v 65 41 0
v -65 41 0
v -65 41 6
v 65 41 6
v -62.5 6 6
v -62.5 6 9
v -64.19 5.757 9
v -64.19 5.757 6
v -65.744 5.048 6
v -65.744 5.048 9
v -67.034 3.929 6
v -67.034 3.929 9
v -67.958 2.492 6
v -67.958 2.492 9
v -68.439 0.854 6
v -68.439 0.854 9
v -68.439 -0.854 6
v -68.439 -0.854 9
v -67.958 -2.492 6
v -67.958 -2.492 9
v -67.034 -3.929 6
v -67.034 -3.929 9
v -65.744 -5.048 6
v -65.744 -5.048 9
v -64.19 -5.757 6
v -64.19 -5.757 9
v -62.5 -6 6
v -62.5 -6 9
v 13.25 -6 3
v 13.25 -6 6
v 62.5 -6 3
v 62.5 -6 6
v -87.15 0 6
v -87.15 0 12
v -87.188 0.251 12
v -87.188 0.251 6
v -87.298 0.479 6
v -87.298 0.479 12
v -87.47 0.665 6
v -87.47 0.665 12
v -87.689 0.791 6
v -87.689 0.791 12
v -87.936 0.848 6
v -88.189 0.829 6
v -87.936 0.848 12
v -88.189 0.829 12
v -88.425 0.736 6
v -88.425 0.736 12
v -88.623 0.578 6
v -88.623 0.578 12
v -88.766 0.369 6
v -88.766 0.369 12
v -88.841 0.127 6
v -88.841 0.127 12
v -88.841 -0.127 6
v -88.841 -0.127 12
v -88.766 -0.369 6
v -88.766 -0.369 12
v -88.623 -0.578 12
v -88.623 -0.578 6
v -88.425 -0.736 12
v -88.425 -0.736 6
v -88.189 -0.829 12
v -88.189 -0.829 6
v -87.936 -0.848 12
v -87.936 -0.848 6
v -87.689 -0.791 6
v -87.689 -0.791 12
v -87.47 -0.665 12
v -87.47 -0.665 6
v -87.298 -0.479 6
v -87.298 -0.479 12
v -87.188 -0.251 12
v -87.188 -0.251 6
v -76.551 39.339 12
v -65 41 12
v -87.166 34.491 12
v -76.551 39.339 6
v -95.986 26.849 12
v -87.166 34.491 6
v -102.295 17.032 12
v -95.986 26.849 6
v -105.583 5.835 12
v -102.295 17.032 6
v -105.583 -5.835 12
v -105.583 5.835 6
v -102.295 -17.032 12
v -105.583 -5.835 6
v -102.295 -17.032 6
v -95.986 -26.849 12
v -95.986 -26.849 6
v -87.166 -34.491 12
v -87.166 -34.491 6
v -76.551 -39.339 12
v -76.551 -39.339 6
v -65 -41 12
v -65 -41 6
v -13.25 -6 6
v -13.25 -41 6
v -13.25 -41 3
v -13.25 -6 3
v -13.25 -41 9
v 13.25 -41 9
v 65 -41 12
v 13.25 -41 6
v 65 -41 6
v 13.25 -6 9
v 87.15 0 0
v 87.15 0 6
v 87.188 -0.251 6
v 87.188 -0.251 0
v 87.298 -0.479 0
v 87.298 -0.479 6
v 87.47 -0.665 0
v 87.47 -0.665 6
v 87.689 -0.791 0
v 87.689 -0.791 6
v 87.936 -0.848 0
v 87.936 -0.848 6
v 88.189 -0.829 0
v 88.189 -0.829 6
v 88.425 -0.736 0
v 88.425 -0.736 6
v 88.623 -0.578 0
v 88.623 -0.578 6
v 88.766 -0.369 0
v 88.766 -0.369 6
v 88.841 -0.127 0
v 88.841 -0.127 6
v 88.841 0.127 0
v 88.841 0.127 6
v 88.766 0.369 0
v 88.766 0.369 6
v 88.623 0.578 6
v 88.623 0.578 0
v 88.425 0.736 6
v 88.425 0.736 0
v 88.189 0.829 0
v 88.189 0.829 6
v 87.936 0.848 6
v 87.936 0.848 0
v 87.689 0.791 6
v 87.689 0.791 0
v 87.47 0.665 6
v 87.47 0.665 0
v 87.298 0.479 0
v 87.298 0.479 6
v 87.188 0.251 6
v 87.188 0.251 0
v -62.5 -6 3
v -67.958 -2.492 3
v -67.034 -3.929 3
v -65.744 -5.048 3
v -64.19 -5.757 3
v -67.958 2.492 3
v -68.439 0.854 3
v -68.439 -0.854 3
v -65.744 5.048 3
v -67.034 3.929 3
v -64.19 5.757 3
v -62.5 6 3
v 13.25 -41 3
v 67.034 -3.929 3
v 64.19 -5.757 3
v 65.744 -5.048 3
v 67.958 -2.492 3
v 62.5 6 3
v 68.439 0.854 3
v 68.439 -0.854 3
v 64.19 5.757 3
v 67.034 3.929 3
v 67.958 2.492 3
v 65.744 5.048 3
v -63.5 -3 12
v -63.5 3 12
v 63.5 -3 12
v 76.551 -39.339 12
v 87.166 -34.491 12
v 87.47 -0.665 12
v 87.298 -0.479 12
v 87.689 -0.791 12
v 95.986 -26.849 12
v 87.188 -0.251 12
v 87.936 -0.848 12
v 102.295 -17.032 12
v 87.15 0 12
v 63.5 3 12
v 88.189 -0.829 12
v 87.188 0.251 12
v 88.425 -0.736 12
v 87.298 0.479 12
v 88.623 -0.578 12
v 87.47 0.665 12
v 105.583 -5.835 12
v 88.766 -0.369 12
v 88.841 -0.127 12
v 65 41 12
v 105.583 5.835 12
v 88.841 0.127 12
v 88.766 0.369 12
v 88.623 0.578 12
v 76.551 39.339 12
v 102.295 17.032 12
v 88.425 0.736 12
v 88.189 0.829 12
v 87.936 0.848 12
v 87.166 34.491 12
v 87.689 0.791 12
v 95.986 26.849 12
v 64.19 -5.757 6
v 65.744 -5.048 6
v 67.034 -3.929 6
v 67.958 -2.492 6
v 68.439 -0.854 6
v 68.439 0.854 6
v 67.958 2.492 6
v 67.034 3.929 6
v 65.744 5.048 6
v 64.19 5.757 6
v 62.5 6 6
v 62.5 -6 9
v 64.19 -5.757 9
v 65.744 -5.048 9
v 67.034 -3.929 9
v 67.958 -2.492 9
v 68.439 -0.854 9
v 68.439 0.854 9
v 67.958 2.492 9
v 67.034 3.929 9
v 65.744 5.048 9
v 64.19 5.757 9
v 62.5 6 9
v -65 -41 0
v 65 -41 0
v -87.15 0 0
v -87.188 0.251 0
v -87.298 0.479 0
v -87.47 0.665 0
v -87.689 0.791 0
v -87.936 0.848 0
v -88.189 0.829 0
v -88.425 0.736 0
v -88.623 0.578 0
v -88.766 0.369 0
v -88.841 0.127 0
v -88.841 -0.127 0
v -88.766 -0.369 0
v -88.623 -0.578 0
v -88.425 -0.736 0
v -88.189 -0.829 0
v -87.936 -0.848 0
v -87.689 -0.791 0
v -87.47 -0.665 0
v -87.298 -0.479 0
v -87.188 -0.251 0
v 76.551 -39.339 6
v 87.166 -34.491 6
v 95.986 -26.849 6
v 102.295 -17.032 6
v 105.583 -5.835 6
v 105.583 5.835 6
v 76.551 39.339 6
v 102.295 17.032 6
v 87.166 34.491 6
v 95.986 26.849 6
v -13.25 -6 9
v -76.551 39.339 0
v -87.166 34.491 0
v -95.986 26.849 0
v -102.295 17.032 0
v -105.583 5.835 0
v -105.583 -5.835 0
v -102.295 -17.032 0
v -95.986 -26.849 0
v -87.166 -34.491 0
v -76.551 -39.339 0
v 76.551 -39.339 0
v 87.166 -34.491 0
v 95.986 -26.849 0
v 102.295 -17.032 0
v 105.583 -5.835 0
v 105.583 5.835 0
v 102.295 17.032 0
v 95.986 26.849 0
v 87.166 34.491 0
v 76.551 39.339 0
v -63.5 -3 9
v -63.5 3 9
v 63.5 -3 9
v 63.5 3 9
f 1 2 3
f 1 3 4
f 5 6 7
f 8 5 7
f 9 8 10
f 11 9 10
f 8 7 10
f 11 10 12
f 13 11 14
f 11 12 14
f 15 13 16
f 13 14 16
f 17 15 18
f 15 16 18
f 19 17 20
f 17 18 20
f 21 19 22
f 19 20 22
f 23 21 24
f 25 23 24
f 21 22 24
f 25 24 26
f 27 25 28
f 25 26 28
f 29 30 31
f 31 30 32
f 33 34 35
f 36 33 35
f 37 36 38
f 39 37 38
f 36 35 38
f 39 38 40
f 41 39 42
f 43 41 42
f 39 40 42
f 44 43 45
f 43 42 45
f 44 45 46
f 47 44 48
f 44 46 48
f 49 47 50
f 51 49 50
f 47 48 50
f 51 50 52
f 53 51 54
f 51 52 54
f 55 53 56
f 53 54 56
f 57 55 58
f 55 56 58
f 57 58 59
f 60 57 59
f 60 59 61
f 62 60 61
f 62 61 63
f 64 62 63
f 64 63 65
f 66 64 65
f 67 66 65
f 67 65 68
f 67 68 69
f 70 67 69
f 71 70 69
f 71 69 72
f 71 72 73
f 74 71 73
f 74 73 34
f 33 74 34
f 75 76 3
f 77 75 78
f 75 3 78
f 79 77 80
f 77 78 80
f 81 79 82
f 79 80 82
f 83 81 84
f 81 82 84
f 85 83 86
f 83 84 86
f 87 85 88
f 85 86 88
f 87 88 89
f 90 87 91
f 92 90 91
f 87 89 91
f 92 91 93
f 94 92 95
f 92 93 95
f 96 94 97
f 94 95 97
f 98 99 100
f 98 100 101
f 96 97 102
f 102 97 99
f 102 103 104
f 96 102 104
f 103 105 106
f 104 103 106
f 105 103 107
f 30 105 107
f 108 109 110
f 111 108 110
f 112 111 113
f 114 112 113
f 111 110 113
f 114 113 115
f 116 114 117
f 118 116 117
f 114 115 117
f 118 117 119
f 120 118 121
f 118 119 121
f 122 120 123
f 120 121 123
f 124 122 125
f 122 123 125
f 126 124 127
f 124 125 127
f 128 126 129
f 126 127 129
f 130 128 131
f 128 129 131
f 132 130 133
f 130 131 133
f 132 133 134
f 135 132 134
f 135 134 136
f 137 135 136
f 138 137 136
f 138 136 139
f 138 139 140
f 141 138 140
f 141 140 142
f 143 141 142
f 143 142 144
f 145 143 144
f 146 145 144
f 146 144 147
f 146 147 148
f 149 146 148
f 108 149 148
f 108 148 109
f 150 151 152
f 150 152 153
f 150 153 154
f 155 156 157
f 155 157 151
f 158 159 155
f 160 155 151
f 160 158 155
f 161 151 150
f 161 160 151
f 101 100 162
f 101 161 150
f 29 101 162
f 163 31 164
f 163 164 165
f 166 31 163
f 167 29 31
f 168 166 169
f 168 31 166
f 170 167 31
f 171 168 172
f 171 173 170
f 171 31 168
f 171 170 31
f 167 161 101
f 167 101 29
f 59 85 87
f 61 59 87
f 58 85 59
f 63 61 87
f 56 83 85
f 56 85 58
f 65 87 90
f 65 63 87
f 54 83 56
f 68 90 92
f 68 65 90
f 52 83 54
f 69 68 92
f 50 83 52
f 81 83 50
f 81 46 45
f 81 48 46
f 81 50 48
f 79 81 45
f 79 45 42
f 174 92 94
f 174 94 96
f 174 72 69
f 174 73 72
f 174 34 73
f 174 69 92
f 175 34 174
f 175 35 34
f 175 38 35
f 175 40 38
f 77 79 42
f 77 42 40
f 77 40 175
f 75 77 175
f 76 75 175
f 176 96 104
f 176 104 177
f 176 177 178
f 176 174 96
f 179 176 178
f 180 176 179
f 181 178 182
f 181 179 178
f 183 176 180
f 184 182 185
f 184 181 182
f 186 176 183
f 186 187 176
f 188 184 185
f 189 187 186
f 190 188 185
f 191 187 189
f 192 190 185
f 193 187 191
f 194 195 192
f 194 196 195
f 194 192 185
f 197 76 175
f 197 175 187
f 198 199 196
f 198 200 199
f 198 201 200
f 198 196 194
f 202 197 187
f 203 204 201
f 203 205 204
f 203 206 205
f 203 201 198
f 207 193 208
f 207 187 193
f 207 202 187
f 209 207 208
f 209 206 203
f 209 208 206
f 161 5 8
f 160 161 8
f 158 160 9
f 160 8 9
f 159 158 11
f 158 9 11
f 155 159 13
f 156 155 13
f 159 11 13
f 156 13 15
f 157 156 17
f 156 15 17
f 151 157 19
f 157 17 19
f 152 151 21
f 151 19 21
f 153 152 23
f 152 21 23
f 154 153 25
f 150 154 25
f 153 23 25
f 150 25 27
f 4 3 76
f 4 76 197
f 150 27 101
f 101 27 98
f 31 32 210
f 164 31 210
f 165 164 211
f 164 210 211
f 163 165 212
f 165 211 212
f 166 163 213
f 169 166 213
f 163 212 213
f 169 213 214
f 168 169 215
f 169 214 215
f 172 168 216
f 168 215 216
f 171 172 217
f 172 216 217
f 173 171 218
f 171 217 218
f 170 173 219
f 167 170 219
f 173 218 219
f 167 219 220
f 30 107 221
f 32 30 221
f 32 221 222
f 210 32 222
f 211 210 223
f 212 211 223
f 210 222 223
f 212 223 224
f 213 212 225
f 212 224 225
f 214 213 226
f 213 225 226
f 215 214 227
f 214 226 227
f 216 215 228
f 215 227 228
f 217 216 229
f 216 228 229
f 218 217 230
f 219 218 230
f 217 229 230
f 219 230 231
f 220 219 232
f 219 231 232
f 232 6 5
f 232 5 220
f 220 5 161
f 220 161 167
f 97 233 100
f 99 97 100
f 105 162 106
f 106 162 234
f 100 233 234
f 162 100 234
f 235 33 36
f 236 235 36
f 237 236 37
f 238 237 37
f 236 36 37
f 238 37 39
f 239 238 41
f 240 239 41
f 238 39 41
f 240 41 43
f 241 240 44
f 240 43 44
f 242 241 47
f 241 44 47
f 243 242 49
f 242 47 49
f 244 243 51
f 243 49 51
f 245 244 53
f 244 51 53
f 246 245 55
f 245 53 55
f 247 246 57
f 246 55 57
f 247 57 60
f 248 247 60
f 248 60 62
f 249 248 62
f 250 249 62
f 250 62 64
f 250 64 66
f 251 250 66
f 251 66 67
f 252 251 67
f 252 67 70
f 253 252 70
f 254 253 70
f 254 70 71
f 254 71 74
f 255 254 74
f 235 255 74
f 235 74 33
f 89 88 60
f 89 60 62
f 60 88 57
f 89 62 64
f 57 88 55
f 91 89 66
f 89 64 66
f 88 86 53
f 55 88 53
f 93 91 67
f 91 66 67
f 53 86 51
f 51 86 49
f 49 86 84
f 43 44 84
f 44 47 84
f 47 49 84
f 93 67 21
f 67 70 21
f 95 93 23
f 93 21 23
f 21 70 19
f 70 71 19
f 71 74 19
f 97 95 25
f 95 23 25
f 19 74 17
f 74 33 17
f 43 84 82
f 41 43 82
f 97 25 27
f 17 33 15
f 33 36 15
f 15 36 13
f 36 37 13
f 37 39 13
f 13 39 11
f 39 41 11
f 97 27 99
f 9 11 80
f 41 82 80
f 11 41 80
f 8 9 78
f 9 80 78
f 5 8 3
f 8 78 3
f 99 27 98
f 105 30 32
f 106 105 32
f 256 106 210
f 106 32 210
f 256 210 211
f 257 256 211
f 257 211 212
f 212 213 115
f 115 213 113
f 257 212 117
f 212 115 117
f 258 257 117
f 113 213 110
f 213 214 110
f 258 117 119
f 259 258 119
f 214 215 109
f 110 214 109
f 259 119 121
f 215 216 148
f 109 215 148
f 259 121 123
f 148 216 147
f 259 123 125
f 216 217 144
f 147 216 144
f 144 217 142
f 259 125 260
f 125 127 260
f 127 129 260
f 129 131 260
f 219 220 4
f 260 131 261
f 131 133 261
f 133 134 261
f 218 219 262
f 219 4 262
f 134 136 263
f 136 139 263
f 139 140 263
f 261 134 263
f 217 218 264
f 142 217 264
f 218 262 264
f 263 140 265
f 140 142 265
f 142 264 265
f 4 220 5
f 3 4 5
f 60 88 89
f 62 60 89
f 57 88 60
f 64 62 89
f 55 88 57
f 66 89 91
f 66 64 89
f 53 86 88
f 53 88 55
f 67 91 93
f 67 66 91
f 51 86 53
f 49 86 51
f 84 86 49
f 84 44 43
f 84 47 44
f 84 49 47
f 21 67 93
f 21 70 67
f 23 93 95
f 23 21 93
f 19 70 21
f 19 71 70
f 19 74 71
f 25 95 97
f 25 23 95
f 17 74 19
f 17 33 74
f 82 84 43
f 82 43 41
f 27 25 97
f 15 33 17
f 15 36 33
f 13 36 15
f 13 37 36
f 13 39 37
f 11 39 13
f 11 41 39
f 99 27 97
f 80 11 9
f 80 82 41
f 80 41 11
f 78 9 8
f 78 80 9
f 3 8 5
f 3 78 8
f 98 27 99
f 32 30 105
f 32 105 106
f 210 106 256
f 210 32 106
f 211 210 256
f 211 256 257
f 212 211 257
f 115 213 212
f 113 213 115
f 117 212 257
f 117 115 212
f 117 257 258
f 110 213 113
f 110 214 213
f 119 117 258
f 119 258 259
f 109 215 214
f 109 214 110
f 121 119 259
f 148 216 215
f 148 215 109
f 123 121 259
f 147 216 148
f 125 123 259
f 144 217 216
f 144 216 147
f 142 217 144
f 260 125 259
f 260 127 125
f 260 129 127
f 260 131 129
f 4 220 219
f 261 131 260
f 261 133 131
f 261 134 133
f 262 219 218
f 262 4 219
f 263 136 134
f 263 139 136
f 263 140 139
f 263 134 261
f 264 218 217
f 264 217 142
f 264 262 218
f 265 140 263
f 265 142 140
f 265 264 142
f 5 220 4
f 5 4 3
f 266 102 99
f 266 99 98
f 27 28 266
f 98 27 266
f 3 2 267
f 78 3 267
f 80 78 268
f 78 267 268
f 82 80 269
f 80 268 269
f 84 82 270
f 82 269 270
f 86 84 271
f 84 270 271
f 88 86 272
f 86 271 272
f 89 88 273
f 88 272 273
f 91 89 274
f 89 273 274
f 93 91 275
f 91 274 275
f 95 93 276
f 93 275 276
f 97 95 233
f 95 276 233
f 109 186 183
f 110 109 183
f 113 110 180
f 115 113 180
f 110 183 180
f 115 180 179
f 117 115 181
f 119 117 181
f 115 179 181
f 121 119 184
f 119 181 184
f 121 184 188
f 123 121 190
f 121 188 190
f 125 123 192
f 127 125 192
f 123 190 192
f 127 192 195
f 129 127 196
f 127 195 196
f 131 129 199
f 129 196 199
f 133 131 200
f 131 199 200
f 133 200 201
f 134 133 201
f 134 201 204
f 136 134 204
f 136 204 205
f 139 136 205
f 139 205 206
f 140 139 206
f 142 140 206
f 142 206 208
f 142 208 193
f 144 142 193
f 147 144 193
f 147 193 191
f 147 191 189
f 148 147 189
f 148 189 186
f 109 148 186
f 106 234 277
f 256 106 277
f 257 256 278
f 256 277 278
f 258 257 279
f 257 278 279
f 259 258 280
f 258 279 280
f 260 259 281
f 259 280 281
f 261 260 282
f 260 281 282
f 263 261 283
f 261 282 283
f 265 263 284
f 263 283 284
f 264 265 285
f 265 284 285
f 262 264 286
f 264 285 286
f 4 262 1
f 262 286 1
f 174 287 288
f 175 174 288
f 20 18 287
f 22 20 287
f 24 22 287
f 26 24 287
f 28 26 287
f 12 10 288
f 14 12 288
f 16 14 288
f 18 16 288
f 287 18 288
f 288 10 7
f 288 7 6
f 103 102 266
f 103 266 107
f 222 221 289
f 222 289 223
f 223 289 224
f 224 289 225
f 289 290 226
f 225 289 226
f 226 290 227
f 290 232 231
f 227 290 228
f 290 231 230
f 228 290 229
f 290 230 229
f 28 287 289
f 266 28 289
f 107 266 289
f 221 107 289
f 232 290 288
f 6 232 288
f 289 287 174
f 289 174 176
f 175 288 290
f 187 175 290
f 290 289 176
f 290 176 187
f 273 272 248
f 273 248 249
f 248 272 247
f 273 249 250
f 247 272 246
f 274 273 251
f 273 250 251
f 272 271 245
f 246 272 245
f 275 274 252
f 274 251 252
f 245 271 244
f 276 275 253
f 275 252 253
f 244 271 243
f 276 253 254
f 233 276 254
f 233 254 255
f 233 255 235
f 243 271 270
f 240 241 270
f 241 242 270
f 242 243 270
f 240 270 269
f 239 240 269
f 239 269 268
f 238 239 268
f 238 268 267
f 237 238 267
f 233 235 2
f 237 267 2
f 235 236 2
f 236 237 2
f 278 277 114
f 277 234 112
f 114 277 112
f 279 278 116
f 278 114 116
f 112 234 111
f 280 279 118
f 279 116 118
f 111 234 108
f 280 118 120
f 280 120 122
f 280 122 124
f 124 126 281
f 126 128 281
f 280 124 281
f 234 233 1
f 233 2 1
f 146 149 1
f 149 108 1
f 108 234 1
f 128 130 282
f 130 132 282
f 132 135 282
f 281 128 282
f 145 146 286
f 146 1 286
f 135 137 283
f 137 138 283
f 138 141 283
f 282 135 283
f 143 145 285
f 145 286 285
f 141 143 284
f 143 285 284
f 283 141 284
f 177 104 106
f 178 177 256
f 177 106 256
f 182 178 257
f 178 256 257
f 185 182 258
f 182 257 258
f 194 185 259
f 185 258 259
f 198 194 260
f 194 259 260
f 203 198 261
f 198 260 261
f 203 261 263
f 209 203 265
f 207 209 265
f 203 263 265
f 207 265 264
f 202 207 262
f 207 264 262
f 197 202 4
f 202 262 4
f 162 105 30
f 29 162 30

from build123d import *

# Parameters (mm, degrees)
BOX_BOTTOM_HALF_0_W     = 214
BOX_BOTTOM_HALF_0_H     = 84
BOX_BOTTOM_HALF_0_DEPTH = 7
PAD_DEPTH               = 9
POCKET_DEPTH            = 6
SKETCH002_W             = 26.5
SKETCH002_H             = 35
POCKET001_DEPTH         = 6
SKETCH003_W             = 127
SKETCH003_H             = 6
PAD001_DEPTH            = 3
SKETCH004_R             = 0.85
POCKET002_DEPTH         = 467.245989
POLARPATTERN_COUNT      = 2


with BuildPart() as box_bottom_half_0_body:
    # box_bottom_half_0 → box_bottom_half_0 (new body)
    with BuildSketch(Plane(origin=(-107, -42, -1), x_dir=(1, 0, 0), z_dir=(0, 0, 1))):
        with Locations((107, 42)):
            Rectangle(BOX_BOTTOM_HALF_0_W, BOX_BOTTOM_HALF_0_H)
    extrude(amount=BOX_BOTTOM_HALF_0_DEPTH)


with BuildPart() as body:
    # Sketch → Pad (new body)
    with BuildSketch(Plane.XY):
        with BuildLine():
            ThreePointArc((-65, 41), (-106, 0), (-65, -41))
            Line((-65, -41), (65, -41))
            ThreePointArc((65, -41), (106, 0), (65, 41))
            Line((-65, 41), (65, 41))
        make_face()
    extrude(amount=PAD_DEPTH)

    # Sketch001 (on Face6 of Pad) → Pocket (cut)
    with BuildSketch(Plane.XY.offset(9)):
        with BuildLine():
            ThreePointArc((-62.5, 6), (-68.5, 0), (-62.5, -6))
            Line((-62.5, -6), (62.5, -6))
            ThreePointArc((62.5, -6), (68.5, 0), (62.5, 6))
            Line((-62.5, 6), (62.5, 6))
        make_face()
    extrude(amount=-POCKET_DEPTH, mode=Mode.SUBTRACT)

    # Sketch002 (on Face5 of Pocket) → Pocket001 (cut)
    with BuildSketch(Plane.XY.offset(9)):
        with Locations((0, -23.5)):
            Rectangle(SKETCH002_W, SKETCH002_H)
    extrude(amount=-POCKET001_DEPTH, mode=Mode.SUBTRACT)

    # Sketch003 (on Face5 of Pocket001) → Pad001 (join)
    with BuildSketch(Plane.XY.offset(9)):
        with BuildLine():
            ThreePointArc((-65, 41), (-106, 0), (-65, -41))
            Line((-65, -41), (65, -41))
            ThreePointArc((65, -41), (106, 0), (65, 41))
            Line((-65, 41), (65, 41))
        make_face()
        Rectangle(SKETCH003_W, SKETCH003_H, mode=Mode.SUBTRACT)
    extrude(amount=PAD001_DEPTH)

    # Sketch004 (on Face12 of Pad001) → Pocket002 (cut, through all)
    with BuildSketch(Plane.XY.offset(12)):
        with Locations((-88, 0)):
            Circle(SKETCH004_R)
    pocket002 = extrude(amount=-POCKET002_DEPTH, mode=Mode.SUBTRACT)

    # PolarPattern: Pocket002 ×2 about axis
    polarpattern_axis = Axis((0, 0, 12), (0, 0, 1))
    for i in range(1, POLARPATTERN_COUNT):
        add(pocket002.rotate(polarpattern_axis, i * 360 / POLARPATTERN_COUNT), mode=Mode.SUBTRACT)


with BuildPart() as bottom_half_0_body:
    # bottom_half_0 base: copy of Body
    add(body.part)

    # bottom_half_0: intersect box_bottom_half_0 body
    add(box_bottom_half_0_body.part, mode=Mode.INTERSECT)


with BuildPart() as top_half_0_body:
    # top_half_0 base: copy of Body
    add(body.part)

    # top_half_0: cut box_bottom_half_0 body
    add(box_bottom_half_0_body.part, mode=Mode.SUBTRACT)


solid = Compound([bottom_half_0_body.part, top_half_0_body.part])
